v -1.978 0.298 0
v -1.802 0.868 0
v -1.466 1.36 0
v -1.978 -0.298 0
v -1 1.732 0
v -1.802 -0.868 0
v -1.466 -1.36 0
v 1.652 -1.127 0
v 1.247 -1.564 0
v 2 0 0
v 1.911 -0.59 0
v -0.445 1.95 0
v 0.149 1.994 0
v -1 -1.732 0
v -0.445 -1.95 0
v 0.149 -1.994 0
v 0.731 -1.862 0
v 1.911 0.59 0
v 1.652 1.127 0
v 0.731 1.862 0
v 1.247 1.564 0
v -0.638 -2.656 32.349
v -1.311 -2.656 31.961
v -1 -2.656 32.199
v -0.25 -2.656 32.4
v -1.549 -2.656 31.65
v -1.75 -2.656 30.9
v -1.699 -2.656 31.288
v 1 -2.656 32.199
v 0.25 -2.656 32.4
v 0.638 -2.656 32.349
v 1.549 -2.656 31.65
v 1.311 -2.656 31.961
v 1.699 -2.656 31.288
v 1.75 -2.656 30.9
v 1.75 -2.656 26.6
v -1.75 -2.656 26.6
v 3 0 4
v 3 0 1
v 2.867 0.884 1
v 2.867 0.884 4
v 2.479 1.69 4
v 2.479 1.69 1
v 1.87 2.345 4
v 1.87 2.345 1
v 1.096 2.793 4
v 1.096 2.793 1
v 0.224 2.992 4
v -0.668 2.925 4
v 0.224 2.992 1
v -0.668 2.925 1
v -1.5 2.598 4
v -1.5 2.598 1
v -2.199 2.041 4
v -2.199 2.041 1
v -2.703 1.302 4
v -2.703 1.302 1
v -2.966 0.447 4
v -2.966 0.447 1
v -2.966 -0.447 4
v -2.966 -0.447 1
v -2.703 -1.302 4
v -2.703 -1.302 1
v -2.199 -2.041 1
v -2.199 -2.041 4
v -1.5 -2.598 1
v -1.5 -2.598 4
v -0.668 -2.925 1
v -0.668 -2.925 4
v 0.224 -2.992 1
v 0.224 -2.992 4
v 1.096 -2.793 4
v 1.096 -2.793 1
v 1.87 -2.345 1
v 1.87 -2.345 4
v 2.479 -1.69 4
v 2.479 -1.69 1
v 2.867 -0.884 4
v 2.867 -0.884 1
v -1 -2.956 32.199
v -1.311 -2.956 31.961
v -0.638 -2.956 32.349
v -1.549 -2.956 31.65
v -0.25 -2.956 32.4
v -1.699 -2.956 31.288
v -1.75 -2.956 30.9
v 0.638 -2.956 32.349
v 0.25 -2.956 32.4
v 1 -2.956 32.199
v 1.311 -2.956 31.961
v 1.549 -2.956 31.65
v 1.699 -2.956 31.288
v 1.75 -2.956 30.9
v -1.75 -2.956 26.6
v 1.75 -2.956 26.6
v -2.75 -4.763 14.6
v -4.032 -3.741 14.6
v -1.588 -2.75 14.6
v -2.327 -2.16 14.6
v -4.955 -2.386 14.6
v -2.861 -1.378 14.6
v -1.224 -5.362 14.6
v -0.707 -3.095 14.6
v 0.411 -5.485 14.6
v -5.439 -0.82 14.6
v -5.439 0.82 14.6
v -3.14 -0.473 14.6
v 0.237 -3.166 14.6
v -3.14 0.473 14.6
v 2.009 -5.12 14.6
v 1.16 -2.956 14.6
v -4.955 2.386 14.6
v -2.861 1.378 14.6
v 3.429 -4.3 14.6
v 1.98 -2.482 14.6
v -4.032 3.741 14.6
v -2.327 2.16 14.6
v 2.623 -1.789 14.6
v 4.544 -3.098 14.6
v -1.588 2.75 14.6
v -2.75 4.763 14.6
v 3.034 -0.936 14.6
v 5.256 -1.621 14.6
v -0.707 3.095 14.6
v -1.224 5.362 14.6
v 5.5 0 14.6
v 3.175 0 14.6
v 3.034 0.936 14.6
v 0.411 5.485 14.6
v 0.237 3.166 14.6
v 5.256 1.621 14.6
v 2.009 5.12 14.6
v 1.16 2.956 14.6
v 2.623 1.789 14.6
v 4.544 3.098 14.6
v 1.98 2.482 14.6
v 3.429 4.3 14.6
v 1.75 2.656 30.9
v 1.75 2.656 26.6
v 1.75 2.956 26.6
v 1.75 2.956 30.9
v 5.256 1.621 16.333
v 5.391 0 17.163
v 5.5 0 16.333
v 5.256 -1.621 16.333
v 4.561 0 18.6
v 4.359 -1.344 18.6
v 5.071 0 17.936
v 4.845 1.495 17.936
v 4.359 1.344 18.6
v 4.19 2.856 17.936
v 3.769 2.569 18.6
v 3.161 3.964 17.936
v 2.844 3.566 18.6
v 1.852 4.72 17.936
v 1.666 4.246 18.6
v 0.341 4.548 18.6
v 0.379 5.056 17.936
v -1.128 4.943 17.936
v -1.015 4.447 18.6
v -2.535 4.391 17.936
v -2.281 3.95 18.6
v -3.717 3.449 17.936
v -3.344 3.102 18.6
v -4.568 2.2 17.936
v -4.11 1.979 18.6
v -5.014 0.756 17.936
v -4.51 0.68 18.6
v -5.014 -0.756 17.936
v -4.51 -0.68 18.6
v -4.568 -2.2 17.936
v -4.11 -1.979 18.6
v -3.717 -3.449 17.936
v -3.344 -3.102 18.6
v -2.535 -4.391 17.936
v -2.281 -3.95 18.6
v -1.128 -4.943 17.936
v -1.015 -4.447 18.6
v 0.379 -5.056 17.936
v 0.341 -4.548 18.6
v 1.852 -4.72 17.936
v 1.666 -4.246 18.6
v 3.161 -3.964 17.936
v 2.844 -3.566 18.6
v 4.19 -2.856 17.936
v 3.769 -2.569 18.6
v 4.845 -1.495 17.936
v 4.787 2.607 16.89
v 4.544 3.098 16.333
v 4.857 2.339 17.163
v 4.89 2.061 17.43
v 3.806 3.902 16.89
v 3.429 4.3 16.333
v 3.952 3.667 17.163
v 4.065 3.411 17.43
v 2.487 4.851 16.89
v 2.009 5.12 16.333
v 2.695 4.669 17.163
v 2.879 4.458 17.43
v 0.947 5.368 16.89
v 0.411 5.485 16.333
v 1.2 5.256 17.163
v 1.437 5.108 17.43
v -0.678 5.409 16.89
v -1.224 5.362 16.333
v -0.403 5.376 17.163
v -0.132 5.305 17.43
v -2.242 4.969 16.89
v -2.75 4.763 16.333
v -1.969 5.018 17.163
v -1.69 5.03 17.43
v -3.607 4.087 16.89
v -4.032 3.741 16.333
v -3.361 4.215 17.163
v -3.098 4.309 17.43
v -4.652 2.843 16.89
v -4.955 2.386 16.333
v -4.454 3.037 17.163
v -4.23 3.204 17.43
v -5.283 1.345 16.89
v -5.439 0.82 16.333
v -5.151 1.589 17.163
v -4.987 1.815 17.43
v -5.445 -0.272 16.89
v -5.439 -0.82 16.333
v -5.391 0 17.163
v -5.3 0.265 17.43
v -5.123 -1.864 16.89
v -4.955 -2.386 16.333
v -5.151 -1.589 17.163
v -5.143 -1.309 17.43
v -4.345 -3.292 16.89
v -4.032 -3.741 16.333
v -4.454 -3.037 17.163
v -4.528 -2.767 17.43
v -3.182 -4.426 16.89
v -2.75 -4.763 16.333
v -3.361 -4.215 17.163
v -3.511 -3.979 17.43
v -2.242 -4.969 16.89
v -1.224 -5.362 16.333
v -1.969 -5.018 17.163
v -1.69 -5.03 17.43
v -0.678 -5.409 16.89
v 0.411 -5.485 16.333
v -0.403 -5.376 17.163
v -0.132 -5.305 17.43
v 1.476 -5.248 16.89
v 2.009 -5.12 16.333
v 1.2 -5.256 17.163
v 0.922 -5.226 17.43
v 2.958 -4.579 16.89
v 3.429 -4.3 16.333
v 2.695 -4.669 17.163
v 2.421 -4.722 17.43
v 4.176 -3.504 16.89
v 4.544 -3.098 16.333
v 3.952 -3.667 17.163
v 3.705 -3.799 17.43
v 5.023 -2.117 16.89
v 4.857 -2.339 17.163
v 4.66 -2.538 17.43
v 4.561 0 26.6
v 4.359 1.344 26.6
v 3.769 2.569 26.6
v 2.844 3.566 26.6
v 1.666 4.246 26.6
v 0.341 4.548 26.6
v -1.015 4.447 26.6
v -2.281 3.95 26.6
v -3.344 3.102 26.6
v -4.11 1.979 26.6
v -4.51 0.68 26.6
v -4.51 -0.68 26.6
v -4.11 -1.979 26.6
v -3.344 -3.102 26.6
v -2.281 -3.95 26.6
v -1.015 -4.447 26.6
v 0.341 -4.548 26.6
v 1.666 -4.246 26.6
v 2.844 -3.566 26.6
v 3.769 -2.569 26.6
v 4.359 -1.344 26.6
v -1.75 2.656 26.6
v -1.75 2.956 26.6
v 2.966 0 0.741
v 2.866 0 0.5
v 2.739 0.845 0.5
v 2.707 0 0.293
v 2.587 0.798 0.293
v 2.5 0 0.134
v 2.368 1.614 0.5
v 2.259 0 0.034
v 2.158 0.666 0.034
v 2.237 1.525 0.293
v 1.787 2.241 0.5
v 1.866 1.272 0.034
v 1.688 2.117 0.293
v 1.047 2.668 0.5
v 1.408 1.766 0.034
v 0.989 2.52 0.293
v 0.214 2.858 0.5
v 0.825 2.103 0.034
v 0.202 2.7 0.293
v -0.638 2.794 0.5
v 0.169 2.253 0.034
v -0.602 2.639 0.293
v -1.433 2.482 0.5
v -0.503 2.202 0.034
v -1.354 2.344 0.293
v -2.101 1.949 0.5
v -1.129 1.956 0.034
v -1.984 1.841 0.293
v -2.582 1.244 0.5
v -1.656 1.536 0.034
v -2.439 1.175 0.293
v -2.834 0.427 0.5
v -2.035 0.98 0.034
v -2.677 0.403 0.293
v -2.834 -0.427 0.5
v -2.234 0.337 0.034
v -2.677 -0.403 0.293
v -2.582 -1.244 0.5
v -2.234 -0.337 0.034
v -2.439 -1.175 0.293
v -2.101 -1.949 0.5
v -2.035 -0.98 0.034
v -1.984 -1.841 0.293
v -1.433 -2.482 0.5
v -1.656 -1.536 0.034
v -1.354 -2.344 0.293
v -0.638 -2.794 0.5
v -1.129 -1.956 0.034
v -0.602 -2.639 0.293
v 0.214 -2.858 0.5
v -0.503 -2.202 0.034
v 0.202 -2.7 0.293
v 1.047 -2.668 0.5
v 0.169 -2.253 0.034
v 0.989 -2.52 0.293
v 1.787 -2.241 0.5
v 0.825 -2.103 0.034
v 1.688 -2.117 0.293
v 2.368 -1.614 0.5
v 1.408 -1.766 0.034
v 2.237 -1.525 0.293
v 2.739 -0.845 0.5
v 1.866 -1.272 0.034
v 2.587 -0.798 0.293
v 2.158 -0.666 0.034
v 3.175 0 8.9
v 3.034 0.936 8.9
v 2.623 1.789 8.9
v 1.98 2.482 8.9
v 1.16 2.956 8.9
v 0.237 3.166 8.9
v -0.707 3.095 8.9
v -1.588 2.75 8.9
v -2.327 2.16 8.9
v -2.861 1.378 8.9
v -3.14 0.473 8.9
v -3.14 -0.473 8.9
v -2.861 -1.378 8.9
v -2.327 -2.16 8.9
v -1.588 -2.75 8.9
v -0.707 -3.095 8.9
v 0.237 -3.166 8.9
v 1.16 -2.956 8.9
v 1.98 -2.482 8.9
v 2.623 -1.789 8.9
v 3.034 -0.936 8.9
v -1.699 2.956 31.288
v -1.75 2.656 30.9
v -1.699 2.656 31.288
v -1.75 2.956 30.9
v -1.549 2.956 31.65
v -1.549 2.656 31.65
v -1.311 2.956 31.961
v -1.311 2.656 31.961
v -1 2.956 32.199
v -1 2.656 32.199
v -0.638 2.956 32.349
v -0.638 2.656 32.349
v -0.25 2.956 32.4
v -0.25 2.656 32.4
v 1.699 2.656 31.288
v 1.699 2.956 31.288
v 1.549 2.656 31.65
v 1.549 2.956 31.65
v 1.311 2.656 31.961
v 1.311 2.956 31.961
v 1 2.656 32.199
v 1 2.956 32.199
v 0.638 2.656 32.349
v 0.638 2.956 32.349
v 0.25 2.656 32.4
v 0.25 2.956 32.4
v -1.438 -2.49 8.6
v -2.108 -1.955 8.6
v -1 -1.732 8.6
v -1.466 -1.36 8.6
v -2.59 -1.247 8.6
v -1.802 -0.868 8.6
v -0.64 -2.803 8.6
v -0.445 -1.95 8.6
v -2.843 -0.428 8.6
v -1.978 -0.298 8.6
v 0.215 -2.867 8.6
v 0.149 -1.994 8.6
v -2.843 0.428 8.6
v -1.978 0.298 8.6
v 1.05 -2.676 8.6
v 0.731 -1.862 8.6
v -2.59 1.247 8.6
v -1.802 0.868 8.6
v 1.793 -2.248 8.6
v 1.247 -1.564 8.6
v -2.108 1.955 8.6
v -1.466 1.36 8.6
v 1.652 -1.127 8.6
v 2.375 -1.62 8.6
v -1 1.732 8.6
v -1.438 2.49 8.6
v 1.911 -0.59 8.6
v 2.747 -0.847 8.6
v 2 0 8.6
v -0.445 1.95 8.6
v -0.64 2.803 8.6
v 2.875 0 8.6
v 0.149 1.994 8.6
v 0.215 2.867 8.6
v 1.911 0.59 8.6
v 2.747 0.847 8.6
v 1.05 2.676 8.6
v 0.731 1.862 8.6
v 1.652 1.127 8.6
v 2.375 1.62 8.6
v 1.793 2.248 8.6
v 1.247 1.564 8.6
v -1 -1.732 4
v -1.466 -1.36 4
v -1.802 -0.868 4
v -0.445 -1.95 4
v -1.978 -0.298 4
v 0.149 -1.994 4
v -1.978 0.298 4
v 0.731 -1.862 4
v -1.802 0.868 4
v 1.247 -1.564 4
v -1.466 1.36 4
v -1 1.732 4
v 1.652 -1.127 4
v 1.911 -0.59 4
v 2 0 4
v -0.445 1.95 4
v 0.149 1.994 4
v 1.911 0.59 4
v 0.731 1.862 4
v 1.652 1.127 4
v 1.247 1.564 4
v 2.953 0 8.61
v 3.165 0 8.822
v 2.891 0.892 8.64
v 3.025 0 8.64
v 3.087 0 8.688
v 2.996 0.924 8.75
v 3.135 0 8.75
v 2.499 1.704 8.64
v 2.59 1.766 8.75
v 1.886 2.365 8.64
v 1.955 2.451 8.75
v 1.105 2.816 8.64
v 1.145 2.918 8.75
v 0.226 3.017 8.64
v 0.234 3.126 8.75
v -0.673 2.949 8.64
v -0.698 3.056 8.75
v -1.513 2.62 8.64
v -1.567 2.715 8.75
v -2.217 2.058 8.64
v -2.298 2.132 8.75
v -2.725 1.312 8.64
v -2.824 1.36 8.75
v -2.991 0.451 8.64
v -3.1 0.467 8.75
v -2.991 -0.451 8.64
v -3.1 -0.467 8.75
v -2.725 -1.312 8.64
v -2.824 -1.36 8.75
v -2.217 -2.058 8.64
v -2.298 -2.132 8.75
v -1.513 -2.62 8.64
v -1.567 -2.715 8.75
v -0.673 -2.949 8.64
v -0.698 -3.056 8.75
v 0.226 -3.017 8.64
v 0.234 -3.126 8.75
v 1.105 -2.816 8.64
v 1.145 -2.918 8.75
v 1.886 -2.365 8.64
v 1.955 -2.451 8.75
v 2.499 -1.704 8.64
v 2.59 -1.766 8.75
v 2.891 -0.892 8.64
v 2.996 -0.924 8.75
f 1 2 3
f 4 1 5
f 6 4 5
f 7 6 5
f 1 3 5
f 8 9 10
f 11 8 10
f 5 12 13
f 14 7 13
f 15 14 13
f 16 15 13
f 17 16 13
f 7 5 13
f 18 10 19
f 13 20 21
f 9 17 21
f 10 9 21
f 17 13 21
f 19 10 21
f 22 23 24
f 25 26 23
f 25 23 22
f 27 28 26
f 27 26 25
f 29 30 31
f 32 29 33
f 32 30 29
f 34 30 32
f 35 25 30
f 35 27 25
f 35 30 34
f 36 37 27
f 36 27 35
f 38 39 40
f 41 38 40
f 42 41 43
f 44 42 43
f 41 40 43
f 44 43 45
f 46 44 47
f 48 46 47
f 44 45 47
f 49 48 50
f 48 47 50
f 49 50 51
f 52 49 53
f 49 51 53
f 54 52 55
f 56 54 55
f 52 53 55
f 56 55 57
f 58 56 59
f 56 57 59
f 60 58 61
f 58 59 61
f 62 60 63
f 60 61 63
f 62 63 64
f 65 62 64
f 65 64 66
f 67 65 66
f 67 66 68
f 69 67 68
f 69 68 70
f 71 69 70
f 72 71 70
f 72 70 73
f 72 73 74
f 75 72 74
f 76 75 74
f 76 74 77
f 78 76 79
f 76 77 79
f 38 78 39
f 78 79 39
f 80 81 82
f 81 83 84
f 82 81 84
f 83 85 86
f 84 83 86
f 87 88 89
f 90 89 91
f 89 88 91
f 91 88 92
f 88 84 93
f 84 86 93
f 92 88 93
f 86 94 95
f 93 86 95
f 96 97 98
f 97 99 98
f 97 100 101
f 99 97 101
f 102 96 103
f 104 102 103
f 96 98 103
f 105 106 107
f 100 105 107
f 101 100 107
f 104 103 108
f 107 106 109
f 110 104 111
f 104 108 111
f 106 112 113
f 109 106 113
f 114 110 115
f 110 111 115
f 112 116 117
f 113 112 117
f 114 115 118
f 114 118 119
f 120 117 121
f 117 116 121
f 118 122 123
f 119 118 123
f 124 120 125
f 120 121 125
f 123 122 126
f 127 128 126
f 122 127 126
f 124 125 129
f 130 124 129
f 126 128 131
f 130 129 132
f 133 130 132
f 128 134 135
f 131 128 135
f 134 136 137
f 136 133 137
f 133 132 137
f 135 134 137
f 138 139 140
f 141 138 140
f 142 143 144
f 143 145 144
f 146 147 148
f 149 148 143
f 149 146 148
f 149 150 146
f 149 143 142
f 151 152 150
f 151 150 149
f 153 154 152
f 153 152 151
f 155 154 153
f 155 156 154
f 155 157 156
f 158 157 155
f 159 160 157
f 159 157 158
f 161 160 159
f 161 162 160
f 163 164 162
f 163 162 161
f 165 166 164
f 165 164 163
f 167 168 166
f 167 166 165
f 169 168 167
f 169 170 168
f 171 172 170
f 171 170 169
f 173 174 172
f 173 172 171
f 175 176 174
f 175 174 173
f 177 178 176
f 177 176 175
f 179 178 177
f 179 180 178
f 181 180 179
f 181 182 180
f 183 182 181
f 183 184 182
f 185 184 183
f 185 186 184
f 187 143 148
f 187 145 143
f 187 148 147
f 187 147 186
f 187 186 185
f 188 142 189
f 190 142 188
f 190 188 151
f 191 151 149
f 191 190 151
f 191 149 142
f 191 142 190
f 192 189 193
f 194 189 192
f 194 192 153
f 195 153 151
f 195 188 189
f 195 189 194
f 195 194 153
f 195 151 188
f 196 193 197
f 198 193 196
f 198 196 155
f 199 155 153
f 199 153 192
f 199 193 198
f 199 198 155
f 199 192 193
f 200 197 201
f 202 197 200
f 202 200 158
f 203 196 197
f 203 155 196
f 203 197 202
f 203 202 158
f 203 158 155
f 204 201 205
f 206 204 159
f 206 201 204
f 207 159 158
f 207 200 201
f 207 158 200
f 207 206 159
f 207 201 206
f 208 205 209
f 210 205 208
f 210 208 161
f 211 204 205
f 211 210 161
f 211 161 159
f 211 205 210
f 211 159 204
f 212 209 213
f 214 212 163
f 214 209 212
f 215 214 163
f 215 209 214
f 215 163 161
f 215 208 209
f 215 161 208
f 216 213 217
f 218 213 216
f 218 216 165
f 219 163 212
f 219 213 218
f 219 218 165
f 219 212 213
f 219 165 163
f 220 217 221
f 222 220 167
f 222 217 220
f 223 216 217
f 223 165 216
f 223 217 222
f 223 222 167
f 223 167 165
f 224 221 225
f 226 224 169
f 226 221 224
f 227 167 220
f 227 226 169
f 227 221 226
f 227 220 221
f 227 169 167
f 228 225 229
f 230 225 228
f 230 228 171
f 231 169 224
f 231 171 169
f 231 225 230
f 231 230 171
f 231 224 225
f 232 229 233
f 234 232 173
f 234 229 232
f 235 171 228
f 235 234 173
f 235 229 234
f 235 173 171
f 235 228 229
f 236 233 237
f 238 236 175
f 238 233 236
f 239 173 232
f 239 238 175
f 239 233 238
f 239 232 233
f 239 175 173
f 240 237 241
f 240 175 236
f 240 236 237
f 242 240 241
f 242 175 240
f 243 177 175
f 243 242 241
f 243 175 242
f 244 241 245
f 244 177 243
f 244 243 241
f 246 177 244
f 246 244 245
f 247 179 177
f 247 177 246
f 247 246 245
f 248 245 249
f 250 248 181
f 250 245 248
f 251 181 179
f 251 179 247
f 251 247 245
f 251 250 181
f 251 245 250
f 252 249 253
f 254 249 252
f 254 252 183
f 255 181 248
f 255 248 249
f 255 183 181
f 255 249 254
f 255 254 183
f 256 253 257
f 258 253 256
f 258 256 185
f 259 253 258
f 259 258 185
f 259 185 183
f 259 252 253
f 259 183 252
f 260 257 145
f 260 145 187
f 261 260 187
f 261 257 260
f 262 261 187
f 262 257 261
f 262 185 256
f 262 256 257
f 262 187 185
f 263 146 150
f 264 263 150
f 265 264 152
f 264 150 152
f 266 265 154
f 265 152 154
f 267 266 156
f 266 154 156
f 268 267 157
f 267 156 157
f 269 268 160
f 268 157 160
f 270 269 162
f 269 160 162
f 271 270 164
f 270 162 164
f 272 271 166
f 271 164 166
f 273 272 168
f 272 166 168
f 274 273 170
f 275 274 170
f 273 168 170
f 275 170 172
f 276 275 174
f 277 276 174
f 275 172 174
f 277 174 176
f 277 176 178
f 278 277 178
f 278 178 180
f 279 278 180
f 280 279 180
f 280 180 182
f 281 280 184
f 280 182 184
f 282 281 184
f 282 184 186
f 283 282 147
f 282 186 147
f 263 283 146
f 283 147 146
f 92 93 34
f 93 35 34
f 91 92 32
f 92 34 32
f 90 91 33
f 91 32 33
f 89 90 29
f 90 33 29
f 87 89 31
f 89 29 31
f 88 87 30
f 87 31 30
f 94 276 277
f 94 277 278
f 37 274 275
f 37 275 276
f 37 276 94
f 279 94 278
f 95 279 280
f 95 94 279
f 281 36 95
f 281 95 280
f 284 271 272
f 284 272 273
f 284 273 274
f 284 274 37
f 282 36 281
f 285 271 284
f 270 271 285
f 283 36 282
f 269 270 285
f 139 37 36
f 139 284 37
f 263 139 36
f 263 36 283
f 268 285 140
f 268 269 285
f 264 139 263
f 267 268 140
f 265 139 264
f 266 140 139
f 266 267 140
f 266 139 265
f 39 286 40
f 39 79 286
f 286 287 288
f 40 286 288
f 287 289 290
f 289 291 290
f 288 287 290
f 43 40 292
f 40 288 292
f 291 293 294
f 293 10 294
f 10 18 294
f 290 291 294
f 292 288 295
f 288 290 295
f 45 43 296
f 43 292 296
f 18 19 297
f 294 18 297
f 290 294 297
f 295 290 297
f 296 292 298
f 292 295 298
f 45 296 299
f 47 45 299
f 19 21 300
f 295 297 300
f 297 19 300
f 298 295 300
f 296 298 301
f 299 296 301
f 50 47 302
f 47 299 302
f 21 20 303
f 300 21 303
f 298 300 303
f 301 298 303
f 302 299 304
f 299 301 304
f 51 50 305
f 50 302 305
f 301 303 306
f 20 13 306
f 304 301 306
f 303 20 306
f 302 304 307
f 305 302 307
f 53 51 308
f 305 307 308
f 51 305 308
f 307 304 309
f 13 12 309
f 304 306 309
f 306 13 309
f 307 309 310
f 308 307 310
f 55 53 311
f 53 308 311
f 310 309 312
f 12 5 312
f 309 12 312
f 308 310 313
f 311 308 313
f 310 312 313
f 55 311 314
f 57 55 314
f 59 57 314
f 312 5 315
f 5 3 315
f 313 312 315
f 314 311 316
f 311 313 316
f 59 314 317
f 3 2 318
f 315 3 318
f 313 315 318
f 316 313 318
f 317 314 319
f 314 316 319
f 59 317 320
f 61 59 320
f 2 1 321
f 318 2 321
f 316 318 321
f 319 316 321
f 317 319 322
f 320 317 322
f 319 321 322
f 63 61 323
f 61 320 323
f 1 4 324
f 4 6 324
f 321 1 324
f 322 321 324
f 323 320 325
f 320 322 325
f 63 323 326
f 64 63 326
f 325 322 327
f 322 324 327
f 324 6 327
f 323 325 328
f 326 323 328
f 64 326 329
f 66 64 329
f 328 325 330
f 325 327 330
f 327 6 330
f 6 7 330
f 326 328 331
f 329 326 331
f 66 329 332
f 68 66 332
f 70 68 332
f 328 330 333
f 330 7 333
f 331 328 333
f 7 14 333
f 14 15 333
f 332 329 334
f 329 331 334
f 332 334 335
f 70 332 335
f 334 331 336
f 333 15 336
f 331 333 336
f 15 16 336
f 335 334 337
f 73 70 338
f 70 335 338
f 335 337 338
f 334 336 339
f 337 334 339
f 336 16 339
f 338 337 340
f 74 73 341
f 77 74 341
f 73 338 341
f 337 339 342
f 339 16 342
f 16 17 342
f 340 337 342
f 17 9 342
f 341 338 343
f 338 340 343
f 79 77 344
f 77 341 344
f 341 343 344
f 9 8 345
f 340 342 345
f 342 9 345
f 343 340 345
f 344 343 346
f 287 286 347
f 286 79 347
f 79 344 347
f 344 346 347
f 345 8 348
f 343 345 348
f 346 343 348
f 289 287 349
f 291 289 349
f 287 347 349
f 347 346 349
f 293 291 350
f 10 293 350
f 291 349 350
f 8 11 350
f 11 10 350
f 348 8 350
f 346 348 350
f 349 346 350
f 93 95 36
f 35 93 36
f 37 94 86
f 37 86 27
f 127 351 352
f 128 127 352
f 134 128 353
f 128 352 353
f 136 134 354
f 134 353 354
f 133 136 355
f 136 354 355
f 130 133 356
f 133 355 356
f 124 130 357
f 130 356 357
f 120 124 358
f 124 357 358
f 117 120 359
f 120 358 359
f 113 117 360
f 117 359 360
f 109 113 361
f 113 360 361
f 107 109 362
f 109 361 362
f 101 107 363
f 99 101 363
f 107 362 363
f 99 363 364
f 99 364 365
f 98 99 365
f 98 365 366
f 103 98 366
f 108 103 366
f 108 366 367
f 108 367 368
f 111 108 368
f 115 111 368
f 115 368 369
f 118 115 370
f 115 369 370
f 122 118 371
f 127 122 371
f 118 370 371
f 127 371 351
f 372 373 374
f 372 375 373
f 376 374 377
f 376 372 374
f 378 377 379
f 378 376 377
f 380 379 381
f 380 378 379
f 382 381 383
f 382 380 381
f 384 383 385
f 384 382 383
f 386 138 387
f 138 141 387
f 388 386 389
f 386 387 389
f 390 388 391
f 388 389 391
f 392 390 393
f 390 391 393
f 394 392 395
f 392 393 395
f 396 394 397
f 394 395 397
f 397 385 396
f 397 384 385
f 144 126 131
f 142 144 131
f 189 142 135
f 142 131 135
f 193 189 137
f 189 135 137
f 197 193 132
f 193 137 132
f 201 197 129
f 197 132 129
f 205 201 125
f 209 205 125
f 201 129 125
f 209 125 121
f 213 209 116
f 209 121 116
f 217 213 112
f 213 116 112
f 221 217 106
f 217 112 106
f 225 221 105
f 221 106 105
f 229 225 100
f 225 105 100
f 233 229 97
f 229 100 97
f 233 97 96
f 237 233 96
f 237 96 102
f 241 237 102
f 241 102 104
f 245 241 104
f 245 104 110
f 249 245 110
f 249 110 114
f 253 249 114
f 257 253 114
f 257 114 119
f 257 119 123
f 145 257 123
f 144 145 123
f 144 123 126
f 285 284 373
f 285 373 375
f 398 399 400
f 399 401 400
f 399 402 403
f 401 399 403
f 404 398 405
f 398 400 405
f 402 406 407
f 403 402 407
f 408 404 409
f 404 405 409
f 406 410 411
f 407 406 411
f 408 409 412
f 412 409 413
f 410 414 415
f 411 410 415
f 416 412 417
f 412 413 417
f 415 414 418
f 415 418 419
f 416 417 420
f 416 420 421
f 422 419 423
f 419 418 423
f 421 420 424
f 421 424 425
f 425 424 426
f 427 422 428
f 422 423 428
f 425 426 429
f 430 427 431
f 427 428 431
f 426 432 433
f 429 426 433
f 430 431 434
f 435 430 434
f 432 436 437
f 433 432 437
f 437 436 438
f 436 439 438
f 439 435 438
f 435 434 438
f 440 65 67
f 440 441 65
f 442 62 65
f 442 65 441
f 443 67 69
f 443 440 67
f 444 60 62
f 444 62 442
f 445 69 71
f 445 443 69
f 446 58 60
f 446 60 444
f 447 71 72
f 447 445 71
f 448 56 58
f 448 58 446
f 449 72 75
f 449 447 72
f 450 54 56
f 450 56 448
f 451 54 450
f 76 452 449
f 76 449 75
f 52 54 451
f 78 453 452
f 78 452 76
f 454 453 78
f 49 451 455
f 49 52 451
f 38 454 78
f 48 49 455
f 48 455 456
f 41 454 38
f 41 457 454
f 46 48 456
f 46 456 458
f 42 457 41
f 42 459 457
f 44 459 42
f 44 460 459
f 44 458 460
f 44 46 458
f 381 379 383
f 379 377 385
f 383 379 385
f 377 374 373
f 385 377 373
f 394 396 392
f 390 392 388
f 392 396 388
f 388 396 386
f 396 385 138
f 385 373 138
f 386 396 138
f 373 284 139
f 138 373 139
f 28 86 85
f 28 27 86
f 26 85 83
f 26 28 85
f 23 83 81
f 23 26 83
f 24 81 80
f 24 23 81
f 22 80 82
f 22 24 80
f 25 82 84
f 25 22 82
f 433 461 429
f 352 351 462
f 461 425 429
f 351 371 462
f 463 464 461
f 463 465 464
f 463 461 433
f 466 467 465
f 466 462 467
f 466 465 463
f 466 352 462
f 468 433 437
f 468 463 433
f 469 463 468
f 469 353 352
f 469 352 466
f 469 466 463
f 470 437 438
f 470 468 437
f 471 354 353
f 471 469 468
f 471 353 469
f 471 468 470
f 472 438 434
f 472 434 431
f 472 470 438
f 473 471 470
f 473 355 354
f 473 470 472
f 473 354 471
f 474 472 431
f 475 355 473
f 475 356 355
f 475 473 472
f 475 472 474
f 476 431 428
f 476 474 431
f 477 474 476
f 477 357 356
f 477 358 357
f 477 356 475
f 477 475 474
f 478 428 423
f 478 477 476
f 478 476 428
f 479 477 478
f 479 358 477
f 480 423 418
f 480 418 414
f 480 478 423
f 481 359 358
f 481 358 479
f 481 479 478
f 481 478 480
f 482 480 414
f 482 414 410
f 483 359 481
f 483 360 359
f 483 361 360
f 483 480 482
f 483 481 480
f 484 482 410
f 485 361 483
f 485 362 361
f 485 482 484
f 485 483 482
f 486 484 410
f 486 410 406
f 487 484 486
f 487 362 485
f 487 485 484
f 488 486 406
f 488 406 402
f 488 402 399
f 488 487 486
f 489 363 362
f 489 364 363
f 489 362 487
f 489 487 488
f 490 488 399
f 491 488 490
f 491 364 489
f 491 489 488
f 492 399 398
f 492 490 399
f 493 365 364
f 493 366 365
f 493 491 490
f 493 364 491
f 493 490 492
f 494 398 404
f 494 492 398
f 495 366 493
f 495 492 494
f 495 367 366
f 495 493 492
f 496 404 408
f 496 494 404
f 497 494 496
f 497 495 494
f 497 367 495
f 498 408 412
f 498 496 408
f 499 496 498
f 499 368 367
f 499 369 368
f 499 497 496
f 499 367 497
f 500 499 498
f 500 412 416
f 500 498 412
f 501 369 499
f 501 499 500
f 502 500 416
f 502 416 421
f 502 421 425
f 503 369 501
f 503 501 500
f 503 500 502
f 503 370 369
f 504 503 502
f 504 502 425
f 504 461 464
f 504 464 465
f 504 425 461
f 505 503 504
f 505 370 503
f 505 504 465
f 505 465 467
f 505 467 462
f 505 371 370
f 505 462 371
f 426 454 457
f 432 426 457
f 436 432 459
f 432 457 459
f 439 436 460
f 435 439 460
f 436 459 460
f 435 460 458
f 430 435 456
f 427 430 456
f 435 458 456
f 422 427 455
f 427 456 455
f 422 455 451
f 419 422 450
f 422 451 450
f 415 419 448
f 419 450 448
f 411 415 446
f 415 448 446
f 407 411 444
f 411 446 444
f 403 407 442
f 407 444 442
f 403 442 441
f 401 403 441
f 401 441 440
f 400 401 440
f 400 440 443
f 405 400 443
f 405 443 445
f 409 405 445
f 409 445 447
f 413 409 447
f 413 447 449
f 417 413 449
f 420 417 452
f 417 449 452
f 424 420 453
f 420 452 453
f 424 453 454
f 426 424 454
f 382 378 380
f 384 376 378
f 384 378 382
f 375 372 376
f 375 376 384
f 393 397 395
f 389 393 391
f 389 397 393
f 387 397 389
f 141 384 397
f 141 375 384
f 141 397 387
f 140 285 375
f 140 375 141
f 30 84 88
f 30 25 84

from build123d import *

# Parameters (mm, degrees)
F0_R      = 3
F1_DEPTH  = 4
F2_R      = 2
F3_DEPTH  = 4.6
F4_R      = 3.175
F5_DEPTH  = 6
F6_R      = 5.5
F7_DEPTH  = 4
F8_R      = 4.5612364212
F9_DEPTH  = 8
F11_R     = 1
F12_R     = 0.3
F13_W     = 3.5
F13_H     = 0.3
F14_DEPTH = 5.8
F15_R     = 1.5


# Not quite as in the source:
# - a fillet or chamfer that OpenCascade refuses, or shapes differently, is made with other operations: its cross-section is extruded or revolved along the edge and cut away or added


with BuildPart() as f1:
    # F0 (on Top) → F1 (new body)
    with BuildSketch(Plane.XY):
        Circle(F0_R)
    extrude(amount=F1_DEPTH)

    # F2 (on face) → F3 (join)
    with BuildSketch(Plane.XY.offset(4)):
        Circle(F2_R)
    extrude(amount=F3_DEPTH)

    # F4 (on face) → F5 (join)
    with BuildSketch(Plane.XY.offset(8.6)):
        Circle(F4_R)
    extrude(amount=F5_DEPTH)

    # F6 (on face) → F7 (join)
    with BuildSketch(Plane.XY.offset(14.6)):
        Circle(F6_R)
    extrude(amount=F7_DEPTH)

    # F8 (on face) → F9 (join)
    with BuildSketch(Plane.XY.offset(18.6)):
        Circle(F8_R)
    extrude(amount=F9_DEPTH)

    # F10: fillet of radius 3.2064860271 on 1 edges, made by hand

    # F10_s1 → F10_t2 (revolve, cut)
    with BuildSketch(Plane.XZ):
        with BuildLine():
            ThreePointArc((5.5, 16.3330664898), (5.256027516, 17.5598778645), (4.5612364212, 18.6))
            Line((4.5612364212, 18.6), (5.5, 18.6))
            Line((5.5, 18.6), (5.5, 16.3330664898))
        make_face()
    revolve(axis=Axis((0, 0, 18.6), (0, 0, 1)), mode=Mode.SUBTRACT)

    # F11
    f11_edges = [f1.edges().sort_by_distance(p)[0] for p in [
        (-3, 0, 0),
    ]]
    fillet(f11_edges, radius=F11_R)

    # F12
    f12_edges = [f1.edges().sort_by_distance(p)[0] for p in [
        (-3.175, 0, 8.6),
    ]]
    fillet(f12_edges, radius=F12_R)

    # F13 (on face) → F14 (join)
    with BuildSketch(Plane.XY.offset(26.6)):
        with Locations((0, 2.8059364047)):
            Rectangle(F13_W, F13_H)
        with Locations((0, -2.8059364047)):
            Rectangle(F13_W, F13_H)
    extrude(amount=F14_DEPTH)

    # F15
    f15_edges = [f1.edges().sort_by_distance(p)[0] for p in [
        (1.75, 2.805936, 32.4),
        (1.75, -2.805936, 32.4),
        (-1.75, -2.805936, 32.4),
        (-1.75, 2.805936, 32.4),
    ]]
    fillet(f15_edges, radius=F15_R)


solid = f1.part
